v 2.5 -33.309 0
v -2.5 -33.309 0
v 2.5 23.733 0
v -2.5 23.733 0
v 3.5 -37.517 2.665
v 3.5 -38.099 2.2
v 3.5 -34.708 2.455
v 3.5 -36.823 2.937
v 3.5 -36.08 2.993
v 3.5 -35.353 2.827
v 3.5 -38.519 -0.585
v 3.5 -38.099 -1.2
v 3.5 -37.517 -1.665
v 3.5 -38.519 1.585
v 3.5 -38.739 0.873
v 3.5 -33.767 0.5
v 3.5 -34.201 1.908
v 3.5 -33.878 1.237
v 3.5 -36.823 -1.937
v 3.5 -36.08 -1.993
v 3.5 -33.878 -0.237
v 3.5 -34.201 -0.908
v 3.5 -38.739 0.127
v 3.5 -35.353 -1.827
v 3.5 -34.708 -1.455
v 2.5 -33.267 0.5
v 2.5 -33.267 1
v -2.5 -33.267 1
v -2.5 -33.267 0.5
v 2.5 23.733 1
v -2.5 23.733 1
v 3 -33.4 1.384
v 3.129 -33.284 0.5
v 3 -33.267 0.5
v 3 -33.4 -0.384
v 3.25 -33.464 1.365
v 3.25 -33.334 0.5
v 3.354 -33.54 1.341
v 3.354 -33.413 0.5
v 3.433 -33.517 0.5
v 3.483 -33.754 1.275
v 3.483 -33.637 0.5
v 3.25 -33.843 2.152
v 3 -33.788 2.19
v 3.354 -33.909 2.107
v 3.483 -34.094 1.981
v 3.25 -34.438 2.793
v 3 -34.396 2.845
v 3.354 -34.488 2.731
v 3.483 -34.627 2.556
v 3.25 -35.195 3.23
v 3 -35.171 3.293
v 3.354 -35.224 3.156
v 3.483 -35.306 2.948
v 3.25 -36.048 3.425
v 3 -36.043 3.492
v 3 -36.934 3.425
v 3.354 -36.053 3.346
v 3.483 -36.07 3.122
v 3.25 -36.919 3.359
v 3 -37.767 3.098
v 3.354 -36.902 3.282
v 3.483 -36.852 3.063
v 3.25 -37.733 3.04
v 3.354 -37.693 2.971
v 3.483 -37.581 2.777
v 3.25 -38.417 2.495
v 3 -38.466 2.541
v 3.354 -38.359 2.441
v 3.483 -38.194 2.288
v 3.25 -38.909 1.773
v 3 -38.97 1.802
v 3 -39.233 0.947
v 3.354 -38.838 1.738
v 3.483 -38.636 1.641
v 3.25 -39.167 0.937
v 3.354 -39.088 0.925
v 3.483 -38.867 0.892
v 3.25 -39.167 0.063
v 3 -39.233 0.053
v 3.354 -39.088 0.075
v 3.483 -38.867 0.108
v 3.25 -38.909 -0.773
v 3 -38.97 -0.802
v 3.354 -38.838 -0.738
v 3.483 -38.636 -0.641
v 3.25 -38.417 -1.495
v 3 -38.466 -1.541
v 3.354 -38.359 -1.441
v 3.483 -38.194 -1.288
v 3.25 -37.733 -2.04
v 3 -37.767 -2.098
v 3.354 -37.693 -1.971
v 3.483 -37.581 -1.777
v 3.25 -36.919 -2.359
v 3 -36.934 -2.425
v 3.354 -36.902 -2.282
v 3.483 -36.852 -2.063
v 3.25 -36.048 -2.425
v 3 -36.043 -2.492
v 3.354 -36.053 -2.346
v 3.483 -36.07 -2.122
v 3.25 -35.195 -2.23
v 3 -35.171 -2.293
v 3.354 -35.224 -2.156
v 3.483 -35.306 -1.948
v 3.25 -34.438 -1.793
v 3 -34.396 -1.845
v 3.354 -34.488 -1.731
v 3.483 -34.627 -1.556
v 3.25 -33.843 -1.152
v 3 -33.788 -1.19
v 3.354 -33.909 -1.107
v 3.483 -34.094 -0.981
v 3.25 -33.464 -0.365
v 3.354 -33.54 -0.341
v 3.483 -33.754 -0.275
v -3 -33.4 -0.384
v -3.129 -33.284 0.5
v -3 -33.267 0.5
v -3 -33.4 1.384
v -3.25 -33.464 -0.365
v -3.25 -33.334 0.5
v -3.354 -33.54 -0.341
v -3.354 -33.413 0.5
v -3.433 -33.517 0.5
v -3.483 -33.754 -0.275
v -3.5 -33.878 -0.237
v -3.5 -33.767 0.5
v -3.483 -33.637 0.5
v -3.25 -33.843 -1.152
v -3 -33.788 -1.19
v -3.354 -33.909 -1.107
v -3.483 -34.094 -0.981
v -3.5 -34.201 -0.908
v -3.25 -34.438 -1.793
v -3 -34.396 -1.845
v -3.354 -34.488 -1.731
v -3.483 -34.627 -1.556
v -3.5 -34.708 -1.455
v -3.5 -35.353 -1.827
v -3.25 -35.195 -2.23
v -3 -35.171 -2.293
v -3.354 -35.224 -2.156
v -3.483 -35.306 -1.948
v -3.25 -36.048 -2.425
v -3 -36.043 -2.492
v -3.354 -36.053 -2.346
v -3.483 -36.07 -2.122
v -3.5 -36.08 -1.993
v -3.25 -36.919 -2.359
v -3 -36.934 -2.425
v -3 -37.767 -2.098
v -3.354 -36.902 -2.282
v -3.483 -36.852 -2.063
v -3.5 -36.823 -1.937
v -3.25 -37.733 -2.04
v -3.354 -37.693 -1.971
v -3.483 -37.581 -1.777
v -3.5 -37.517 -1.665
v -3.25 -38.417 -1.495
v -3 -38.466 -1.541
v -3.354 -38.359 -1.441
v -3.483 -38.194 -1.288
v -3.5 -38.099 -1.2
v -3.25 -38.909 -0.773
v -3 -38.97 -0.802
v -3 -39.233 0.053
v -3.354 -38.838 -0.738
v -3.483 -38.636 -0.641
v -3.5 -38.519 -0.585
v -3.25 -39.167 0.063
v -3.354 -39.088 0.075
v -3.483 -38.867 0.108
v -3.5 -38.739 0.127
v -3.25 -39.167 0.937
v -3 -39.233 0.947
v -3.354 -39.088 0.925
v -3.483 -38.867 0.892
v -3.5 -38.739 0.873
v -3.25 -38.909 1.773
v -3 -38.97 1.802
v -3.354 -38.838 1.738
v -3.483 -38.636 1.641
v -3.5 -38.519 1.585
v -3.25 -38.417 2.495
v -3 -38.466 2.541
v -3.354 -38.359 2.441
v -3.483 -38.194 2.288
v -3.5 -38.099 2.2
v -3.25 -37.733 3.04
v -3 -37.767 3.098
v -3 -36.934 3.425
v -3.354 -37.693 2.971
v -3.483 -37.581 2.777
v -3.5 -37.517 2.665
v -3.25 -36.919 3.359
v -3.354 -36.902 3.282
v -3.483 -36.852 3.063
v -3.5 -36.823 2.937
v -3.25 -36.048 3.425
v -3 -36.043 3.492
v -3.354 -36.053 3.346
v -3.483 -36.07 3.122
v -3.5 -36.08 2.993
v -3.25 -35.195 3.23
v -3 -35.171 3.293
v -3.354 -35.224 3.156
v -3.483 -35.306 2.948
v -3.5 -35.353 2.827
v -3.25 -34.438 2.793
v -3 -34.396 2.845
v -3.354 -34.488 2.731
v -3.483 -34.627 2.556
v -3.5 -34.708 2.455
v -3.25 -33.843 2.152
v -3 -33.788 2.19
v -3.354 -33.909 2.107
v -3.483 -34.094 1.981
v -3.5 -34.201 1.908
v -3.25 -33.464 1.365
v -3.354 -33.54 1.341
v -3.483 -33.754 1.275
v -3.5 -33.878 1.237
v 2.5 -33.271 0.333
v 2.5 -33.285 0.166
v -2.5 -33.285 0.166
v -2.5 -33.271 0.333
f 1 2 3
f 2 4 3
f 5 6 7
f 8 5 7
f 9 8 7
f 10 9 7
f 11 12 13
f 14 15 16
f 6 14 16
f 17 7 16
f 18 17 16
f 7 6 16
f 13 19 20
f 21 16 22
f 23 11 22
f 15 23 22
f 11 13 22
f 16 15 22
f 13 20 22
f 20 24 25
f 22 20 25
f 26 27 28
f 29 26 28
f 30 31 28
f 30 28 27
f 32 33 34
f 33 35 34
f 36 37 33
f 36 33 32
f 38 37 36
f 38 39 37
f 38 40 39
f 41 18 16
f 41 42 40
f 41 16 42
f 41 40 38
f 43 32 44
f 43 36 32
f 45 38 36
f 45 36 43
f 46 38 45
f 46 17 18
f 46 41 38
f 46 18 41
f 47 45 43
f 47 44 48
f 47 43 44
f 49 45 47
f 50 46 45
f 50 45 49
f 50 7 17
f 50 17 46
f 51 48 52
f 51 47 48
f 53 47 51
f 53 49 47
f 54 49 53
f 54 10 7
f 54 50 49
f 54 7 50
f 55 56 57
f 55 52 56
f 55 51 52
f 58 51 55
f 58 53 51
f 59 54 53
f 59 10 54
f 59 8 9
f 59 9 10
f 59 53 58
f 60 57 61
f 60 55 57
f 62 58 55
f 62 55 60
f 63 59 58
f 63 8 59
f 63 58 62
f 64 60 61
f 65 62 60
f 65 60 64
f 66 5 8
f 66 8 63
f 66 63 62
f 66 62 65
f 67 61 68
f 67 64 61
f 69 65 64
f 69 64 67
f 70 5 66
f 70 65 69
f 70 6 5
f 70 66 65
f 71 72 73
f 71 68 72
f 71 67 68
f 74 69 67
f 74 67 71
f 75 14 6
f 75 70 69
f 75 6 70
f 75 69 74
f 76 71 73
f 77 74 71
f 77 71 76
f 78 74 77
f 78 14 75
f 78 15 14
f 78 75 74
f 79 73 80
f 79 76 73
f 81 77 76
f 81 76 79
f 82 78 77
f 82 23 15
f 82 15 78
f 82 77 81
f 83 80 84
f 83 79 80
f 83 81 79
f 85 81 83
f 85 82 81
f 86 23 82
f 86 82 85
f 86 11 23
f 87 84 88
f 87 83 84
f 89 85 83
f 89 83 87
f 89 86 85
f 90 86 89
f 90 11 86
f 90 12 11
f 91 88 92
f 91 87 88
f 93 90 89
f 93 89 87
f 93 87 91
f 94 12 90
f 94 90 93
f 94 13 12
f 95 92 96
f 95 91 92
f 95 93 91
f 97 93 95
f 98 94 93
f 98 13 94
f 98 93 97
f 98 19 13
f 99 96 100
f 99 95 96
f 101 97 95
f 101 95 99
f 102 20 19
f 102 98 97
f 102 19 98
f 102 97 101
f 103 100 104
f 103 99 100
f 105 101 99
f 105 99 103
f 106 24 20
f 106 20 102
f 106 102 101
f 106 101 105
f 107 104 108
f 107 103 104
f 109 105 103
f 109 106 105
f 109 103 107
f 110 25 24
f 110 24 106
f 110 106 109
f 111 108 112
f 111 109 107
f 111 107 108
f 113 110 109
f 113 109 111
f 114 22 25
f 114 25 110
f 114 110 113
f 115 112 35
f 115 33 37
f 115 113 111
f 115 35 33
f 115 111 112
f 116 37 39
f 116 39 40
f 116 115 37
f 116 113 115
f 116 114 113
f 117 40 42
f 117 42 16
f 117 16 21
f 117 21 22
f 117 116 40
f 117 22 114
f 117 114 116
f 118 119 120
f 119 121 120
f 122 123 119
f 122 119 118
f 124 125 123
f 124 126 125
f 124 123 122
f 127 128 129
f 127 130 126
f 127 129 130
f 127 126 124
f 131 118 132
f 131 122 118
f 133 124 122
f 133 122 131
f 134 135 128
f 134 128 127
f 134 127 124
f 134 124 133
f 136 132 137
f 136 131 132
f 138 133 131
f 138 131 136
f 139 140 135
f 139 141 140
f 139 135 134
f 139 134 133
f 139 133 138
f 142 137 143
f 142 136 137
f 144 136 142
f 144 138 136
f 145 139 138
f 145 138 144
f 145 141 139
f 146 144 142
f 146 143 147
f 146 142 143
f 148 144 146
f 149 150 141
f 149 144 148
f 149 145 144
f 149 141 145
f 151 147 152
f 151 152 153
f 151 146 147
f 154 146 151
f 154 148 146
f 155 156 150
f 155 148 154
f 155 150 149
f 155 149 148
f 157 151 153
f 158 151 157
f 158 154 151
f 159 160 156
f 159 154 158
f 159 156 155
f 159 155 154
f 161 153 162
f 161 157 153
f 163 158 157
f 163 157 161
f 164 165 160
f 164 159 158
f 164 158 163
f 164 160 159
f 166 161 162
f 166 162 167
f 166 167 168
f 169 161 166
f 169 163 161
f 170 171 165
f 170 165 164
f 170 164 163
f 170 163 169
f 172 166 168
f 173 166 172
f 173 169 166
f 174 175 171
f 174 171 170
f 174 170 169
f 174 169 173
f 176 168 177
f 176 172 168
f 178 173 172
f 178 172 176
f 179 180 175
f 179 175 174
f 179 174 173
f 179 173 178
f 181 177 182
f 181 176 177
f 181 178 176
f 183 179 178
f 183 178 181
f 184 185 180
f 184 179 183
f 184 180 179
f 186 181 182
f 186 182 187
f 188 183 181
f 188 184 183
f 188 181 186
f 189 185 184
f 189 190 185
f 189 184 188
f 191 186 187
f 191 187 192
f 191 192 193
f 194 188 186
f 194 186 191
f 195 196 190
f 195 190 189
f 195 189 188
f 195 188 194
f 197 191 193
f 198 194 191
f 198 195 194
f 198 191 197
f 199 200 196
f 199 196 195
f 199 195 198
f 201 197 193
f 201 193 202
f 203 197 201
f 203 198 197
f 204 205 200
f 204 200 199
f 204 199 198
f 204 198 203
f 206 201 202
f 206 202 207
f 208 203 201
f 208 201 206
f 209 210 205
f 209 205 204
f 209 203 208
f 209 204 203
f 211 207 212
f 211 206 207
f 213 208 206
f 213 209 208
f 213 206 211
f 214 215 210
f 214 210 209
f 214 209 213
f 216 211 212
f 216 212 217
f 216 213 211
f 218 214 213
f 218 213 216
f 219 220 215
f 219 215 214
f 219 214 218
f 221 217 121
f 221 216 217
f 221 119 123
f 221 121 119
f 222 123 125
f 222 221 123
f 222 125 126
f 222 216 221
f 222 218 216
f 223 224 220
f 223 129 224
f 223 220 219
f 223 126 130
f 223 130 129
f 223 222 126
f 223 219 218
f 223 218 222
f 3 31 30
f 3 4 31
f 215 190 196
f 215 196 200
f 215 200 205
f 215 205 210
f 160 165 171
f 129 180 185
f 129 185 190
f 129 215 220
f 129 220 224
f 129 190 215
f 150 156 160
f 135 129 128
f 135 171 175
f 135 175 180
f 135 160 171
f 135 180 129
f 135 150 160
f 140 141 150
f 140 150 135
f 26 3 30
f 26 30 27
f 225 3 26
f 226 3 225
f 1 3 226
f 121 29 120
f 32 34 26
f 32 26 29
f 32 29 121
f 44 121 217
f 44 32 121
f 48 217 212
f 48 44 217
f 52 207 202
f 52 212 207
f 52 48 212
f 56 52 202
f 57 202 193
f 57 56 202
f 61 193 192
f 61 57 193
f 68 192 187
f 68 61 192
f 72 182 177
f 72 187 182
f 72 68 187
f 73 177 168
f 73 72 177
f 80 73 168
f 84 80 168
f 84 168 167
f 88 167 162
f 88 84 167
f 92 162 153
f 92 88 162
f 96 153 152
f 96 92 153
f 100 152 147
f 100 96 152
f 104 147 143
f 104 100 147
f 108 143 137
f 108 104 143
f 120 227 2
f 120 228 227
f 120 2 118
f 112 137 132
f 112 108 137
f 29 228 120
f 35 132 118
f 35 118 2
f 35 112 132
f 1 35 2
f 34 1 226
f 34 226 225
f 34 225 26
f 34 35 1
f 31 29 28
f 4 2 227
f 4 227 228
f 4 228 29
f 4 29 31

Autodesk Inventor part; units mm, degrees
ref_plane "YZ Plane" through (0, 0, 0) normal (1, 0, 0) x (0, 1, 0)
ref_plane "XZ Plane" through (0, 0, 0) normal (0, 1, 0) x (-1, 0, 0)
ref_plane "XY Plane" through (0, 0, 0) normal (0, 0, 1) x (1, 0, 0)
sketch "スケッチ1" plane through (0, 0, 0) normal (0, 0, 1) x (1, 0, 0)
  line L0 (-2.5, 23.7333) -> (2.5, 23.7333)
  line L1 (2.5, 23.7333) -> (2.5, -36.2667)
  line L2 (2.5, -36.2667) -> (-2.5, -36.2667)
  line L3 (-2.5, -36.2667) -> (-2.5, 23.7333)
  point P0 (0, 0)
  dimension "d0" = 5
  dimension "d1" = 2.5
  dimension "d2" = 60
extrude "押し出し1" add sketch "スケッチ1" along normal blind 1
sketch "スケッチ2" plane through (0, 0, 1) normal (0, 0, 1) x (1, 0, 0)
  line L0 (2.5, 23.7333) -> (2.5, -36.2667) projected
  line L1 (-2.5, -36.2667) -> (2.5, -36.2667)
  line L2 (2.5, -36.2667) -> (2.5, -33.2667)
  line L3 (2.5, -33.2667) -> (-2.5, -33.2667)
  line L4 (-2.5, -33.2667) -> (-2.5, -36.2667)
  point P0 (0, 0)
  dimension "d5" = 3
extrude "押し出し2" cut sketch "スケッチ2" against normal blind 0.5
sketch "スケッチ4" plane through (0, 0, 0.5) normal (0, 0, 1) x (1, 0, 0)
  line L0 (2.5, -33.2667) -> (2.5, -36.2667) projected
  line L1 (2.5, -36.2667) -> (-2.5, -36.2667) projected
  line L2 (-3.5, -33.2667) -> (3.5, -33.2667)
  line L3 (3.5, -33.2667) -> (3.5, -36.2667)
  line L4 (3.5, -36.2667) -> (-3.5, -36.2667)
  line L5 (-3.5, -36.2667) -> (-3.5, -33.2667)
  point P0 (0, 0)
  dimension "d9" = 7
  dimension "d10" = 1
revolve "回転2" add sketch "スケッチ4" angle 360 about axis through (2.5, -36.2667, 0.5) along (-1, 0, 0)
fillet "フィレット1" radius 0.5 2 edges at (-3.5, -39.2667, 0.5) (3.5, -39.2667, 0.5)
equation "\"d1\" = 0.5 * d0"
properties part number "JointD2_2nd" material "アルミニウム 6061"
